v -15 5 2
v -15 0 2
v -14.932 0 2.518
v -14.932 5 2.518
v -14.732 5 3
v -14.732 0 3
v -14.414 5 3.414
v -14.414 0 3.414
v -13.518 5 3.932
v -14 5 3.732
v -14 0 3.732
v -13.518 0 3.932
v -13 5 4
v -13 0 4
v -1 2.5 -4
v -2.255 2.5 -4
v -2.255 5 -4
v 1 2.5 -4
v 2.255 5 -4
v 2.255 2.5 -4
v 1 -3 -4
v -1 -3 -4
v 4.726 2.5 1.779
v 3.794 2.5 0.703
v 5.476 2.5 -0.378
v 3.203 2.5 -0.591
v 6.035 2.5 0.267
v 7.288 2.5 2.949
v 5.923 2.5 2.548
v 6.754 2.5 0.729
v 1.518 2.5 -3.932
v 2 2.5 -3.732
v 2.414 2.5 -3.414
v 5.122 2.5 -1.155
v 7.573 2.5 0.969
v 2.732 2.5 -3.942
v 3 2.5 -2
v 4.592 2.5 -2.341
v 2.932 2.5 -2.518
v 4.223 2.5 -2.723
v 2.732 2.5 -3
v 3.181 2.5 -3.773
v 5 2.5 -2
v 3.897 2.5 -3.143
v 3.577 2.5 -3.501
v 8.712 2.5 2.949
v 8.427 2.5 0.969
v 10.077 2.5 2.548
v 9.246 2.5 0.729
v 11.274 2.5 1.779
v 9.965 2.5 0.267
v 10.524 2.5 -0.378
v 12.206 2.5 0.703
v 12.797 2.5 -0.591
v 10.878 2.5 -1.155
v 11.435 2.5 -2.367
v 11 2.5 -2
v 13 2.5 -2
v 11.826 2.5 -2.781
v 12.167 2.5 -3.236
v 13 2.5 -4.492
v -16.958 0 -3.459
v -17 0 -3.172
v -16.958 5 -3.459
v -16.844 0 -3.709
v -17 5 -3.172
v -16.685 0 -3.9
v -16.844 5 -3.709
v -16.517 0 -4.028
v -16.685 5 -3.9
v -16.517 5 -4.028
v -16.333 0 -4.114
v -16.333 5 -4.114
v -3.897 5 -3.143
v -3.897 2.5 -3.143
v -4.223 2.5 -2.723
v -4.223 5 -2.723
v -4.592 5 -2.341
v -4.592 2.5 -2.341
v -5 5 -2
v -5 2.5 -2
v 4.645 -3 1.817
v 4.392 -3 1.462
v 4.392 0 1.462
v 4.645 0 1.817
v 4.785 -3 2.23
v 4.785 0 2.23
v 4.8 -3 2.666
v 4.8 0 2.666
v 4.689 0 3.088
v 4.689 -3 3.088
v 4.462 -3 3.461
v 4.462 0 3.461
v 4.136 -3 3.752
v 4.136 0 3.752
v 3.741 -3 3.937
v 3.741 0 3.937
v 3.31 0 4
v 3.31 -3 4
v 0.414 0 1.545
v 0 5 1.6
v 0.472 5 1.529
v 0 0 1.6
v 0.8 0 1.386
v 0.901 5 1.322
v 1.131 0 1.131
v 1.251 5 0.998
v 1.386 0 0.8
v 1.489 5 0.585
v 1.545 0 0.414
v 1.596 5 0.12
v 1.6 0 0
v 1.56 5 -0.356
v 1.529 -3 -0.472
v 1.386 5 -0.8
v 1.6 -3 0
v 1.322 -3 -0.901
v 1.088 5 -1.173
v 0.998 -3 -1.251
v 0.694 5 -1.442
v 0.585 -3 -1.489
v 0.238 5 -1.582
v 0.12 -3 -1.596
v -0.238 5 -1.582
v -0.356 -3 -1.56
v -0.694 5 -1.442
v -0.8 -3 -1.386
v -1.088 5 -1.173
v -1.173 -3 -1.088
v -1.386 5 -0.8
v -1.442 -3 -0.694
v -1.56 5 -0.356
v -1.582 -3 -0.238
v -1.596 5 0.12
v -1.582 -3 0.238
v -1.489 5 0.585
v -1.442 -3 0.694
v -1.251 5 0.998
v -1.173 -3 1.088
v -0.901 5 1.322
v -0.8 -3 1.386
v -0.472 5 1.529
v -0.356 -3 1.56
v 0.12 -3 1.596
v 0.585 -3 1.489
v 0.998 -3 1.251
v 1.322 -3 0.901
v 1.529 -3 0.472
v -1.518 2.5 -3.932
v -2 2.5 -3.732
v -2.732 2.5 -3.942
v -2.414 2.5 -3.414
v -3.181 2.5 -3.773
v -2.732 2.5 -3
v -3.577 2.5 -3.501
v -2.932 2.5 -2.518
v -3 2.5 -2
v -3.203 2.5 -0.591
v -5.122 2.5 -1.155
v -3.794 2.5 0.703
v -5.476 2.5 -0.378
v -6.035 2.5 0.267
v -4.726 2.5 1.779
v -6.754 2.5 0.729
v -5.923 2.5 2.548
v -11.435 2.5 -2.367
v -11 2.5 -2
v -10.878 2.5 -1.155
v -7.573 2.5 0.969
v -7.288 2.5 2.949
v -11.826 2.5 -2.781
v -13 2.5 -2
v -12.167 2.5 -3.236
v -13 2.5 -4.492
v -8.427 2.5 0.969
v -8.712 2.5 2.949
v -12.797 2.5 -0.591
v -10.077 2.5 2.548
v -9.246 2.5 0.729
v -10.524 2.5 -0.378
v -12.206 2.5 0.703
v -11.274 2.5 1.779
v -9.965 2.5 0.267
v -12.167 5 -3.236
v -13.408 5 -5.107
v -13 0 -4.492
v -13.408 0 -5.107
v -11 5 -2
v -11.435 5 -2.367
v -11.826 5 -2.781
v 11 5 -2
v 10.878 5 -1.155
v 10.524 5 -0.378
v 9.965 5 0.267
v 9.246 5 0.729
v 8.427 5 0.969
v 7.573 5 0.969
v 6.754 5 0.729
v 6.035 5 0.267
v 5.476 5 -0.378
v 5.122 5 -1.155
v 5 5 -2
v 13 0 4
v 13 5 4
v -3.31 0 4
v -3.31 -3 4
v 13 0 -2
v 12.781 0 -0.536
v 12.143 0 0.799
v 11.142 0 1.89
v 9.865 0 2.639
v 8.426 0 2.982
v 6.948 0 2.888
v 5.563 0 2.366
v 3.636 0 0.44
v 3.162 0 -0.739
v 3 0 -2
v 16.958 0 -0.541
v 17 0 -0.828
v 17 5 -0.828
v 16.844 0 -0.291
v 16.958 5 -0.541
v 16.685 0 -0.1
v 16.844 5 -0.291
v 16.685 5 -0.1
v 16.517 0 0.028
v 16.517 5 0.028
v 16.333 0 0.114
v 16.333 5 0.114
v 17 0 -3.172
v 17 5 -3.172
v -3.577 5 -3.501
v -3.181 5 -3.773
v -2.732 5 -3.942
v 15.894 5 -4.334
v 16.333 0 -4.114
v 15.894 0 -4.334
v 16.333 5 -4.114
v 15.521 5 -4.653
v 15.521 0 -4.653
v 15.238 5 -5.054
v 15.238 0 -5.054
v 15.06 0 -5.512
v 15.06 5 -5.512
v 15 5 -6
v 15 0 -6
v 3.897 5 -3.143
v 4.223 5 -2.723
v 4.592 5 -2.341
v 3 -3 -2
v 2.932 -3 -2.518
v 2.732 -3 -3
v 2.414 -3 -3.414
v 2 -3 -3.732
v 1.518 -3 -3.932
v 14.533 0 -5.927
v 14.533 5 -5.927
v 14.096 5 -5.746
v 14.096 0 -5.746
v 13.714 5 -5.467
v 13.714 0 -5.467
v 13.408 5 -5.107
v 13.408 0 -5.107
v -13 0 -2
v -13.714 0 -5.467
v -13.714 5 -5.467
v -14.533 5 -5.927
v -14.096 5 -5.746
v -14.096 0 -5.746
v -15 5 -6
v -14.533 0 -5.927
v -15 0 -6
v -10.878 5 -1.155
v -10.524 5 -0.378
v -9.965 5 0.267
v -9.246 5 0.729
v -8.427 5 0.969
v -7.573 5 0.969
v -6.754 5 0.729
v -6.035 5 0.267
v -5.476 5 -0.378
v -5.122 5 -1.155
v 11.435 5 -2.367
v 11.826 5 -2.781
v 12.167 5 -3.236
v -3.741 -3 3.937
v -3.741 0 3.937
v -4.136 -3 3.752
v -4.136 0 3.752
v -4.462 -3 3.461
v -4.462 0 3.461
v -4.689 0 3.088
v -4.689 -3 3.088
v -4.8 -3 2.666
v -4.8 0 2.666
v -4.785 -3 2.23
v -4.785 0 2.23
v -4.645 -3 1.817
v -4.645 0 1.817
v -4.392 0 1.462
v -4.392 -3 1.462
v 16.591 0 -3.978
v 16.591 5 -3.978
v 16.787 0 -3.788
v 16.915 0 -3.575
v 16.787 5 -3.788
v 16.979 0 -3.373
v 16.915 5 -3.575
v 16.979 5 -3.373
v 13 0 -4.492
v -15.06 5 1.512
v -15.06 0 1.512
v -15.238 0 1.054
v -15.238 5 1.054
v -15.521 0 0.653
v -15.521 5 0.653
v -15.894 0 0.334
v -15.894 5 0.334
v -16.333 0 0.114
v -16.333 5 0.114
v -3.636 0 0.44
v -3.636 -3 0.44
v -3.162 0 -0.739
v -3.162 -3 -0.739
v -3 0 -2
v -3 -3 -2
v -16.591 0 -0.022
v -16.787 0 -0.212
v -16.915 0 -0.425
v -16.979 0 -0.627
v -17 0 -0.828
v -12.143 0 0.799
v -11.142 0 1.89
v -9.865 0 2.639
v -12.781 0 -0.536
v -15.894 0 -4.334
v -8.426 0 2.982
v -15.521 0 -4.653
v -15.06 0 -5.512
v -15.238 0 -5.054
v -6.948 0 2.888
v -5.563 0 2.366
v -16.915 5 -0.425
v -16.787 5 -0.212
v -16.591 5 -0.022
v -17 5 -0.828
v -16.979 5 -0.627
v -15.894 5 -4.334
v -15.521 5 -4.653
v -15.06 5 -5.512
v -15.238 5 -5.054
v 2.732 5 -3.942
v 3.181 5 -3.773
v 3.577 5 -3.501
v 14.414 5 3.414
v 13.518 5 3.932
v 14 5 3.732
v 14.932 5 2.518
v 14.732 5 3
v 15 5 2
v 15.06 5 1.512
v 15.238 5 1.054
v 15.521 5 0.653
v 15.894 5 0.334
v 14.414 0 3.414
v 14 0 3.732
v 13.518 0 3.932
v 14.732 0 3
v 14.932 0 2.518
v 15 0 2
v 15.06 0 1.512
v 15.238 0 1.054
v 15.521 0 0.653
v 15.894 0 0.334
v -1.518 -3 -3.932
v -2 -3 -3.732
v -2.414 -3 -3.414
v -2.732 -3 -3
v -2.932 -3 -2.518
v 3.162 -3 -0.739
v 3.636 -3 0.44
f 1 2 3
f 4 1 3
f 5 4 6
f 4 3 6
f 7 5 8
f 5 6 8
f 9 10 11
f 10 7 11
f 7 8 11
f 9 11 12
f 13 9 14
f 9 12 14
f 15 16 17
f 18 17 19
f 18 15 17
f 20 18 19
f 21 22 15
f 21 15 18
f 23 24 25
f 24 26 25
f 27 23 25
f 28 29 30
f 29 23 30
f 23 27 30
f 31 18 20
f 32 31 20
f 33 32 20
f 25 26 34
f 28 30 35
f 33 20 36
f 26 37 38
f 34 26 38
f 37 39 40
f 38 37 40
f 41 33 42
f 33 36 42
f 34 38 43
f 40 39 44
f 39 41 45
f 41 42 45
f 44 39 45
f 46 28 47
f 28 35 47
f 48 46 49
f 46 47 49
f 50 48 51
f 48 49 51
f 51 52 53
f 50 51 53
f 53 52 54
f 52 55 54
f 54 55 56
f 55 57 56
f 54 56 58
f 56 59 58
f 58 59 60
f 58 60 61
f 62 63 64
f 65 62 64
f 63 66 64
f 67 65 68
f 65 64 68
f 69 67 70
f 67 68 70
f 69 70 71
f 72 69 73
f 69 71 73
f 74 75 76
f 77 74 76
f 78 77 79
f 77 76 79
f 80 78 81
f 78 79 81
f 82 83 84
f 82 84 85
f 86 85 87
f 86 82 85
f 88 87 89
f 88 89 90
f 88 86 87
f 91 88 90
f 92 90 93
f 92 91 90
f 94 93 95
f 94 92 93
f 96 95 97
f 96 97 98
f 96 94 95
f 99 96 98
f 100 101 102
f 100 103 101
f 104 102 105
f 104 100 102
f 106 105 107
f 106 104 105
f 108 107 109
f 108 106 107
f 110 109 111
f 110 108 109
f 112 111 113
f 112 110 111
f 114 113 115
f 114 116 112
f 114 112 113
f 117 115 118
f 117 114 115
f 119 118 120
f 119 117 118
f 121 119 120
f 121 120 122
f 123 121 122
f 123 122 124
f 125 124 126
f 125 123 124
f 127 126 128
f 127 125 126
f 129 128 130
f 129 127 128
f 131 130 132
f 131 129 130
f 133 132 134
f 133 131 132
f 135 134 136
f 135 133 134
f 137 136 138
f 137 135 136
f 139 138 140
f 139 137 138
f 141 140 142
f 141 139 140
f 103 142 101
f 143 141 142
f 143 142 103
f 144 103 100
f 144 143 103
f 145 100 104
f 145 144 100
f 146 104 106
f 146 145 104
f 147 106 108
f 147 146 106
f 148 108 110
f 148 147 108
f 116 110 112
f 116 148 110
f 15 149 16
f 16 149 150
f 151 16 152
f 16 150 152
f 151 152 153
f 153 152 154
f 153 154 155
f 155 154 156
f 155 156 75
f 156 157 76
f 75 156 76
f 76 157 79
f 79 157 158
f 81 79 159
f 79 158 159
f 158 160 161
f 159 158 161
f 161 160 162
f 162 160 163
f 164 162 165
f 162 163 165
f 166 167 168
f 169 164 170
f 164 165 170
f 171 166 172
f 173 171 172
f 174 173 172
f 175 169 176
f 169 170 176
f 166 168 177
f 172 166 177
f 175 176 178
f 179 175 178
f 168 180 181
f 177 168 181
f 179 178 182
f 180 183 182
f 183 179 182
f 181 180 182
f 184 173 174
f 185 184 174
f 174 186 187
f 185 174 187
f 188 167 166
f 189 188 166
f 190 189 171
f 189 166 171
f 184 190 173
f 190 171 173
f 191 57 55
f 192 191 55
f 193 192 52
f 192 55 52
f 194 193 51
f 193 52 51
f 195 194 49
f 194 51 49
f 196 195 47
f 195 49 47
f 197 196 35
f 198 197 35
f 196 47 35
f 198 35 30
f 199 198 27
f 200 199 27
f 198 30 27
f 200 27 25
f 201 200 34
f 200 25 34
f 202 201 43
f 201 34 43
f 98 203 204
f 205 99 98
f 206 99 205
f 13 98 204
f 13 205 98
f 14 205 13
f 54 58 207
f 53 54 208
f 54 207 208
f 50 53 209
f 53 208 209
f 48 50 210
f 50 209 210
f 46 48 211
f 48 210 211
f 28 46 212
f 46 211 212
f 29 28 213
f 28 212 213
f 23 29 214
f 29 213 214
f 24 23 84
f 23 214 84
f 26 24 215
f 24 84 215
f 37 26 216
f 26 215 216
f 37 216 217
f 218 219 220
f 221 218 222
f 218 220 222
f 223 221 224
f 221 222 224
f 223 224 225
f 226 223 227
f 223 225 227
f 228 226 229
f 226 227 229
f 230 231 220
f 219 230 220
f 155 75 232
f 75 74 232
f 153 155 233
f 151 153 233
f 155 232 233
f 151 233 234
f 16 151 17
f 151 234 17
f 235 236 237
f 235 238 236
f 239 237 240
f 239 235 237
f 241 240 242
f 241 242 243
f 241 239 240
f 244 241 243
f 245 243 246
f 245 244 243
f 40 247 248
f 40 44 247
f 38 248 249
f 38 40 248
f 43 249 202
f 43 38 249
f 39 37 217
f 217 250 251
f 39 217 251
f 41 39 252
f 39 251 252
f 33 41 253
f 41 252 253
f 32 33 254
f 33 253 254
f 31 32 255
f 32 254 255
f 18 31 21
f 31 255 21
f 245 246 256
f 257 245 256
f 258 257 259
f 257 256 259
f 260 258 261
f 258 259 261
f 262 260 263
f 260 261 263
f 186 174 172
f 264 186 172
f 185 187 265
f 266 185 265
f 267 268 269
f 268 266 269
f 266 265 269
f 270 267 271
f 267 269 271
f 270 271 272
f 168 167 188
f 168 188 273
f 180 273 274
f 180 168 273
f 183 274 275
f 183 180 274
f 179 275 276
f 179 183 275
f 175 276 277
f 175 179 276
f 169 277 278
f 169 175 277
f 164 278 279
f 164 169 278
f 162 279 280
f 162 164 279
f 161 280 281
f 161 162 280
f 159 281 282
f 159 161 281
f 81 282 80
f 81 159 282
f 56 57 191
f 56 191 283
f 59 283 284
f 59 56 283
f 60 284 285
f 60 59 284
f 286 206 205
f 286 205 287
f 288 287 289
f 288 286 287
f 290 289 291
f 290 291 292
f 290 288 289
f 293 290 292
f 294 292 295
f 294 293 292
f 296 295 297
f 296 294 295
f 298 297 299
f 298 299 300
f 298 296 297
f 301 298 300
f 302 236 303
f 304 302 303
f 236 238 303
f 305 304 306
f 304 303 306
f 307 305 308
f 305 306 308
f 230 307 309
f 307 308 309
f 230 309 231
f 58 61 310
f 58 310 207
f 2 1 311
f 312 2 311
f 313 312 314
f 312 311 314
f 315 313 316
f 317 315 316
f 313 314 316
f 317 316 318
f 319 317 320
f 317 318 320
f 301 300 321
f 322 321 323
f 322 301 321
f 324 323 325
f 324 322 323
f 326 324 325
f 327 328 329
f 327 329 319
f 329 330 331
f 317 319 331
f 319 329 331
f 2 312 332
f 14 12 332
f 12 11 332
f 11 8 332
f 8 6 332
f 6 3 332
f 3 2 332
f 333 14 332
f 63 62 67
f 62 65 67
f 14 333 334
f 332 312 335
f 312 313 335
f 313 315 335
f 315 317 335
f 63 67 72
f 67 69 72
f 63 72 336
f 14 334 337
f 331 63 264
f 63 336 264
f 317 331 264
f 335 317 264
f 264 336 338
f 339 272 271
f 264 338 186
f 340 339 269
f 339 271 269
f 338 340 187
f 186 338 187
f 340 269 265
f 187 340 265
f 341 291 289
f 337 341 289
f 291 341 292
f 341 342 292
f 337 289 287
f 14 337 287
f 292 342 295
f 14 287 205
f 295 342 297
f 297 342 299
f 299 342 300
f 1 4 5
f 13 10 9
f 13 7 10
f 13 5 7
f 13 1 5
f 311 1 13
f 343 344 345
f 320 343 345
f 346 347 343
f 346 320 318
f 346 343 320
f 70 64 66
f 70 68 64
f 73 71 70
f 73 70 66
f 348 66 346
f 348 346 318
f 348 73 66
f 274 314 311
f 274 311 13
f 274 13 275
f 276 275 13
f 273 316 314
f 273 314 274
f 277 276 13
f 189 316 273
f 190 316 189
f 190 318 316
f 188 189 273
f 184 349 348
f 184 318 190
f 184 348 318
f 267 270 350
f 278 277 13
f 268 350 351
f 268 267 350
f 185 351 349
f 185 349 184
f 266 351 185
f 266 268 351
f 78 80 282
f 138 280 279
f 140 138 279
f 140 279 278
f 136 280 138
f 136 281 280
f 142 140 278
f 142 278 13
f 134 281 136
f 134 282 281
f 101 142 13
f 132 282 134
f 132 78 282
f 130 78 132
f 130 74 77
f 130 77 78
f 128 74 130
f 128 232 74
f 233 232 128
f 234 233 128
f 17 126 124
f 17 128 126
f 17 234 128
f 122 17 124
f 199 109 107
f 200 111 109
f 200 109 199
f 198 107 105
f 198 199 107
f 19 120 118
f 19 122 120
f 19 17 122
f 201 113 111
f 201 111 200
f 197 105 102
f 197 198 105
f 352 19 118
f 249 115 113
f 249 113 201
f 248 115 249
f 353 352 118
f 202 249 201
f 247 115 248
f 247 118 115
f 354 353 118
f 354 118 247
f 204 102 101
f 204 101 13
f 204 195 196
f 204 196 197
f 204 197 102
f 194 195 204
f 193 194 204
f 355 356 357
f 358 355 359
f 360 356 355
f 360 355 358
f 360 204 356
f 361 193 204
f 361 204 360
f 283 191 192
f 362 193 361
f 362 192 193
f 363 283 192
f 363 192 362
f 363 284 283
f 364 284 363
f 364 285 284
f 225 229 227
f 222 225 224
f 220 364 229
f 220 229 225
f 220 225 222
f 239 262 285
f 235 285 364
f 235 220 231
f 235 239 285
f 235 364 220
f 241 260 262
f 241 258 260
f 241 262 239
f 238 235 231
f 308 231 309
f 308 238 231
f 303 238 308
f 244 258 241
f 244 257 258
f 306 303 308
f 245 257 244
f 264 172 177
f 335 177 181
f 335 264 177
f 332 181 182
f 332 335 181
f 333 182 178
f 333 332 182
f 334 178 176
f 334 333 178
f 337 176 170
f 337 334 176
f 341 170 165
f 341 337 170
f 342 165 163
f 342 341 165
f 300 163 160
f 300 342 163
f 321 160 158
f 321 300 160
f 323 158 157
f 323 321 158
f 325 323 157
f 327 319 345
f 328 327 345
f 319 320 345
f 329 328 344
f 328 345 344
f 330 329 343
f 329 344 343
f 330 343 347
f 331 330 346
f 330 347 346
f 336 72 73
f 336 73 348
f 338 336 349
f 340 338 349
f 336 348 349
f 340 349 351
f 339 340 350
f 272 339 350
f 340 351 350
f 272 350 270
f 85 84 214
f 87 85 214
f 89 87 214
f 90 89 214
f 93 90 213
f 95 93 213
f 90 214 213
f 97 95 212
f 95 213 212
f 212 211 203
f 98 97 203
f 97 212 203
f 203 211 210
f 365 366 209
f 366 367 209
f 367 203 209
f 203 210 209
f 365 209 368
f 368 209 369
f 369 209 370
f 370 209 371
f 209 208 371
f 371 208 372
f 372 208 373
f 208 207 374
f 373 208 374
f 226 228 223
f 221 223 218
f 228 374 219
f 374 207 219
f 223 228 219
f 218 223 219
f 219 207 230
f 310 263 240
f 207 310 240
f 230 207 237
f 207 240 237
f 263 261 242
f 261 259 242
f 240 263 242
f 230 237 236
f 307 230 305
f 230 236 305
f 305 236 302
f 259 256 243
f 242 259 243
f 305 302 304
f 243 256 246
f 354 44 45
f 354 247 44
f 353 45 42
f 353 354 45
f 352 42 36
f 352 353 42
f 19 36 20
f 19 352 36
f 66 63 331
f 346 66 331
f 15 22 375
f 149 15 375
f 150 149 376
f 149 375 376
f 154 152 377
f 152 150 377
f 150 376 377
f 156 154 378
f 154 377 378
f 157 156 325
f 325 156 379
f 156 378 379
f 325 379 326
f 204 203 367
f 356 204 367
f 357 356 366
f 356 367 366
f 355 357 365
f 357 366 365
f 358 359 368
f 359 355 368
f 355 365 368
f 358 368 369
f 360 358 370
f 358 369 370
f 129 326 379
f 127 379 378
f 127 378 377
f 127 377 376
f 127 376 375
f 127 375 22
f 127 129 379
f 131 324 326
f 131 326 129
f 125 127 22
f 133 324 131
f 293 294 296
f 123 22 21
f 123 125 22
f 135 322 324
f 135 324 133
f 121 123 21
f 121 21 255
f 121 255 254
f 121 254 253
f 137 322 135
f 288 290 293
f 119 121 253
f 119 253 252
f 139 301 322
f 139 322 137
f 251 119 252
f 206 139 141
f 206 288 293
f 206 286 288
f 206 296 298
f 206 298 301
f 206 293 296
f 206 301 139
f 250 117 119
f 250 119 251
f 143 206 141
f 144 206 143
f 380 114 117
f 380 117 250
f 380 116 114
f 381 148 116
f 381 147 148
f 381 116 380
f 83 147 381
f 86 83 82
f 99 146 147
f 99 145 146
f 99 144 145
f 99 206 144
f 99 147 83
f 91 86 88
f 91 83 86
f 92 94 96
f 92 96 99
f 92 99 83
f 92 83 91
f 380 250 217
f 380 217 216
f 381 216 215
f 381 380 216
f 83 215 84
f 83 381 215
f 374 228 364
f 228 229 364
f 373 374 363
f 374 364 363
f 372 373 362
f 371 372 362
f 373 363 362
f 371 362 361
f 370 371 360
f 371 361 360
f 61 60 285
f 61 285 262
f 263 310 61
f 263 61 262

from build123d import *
from build123d.topology import SkipClean

# Parameters (mm, degrees)
SKETCH_1_R          = 1.6
EXTRUDE_1_DEPTH     = 5
CUT_EXTRUDE_1_DEPTH = 2.5
CUT_EXTRUDE_3_DEPTH = 17.347782724
CUT_EXTRUDE_4_DEPTH = 17.911534525
SKETCH_8_W          = 6.83484861
SKETCH_8_H          = 2
CUT_EXTRUDE_5_DEPTH = 17.911534525
EXTRUDE_START       = 3
SKETCH_14_R         = 1.6
EXTRUDE_7_DEPTH     = 3
FILLET_2_R          = 2
SKETCH_15_W         = 2
SKETCH_15_H         = 4
EXTRUDE_8_DEPTH     = 5
FILLET_3_R          = 2
FILLET_4_R          = 1


# Some blends are built 0.0001 mm under size
with BuildPart() as part:
    # 草图1 → 凸台-拉伸1 (new body)
    with BuildSketch(Plane(origin=(0, 0, 0), x_dir=(1, 0, 0), z_dir=(0, 1, 0))):
        Polygon((-15, -4), (15, -4), (15, 4), (15, 6), (-15, 6), (-15, 4), align=None)
        with Locations(Location((0, 0, 0), (0, 0, 270))):
            Circle(SKETCH_1_R, mode=Mode.SUBTRACT)
    extrude(amount=EXTRUDE_1_DEPTH)

    # 草图4 → 切除-拉伸1 (cut)
    with BuildSketch(Plane.XZ):
        with BuildLine():
            Line((-13, -6), (-13, -2))
            ThreePointArc((-13, -2), (-8, 3), (-3, -2))
            Line((-3, -2), (-3, -6))
            ThreePointArc((-3, -6), (-8, -11), (-13, -6))
        make_face()
        with BuildLine():
            Line((13, -6), (13, -2))
            ThreePointArc((13, -2), (8, 3), (3, -2))
            Line((3, -2), (3, -6))
            ThreePointArc((3, -6), (8, -11), (13, -6))
        make_face()
    extrude(amount=-CUT_EXTRUDE_1_DEPTH, mode=Mode.SUBTRACT)

    # 草图6 → 切除-拉伸3 (cut, through all)
    with BuildSketch(Plane.XZ.offset(-2.5)):
        with BuildLine():
            Line((-11, -6), (-11, -2))
            ThreePointArc((-11, -2), (-8, 1), (-5, -2))
            Line((-5, -2), (-5, -6))
            ThreePointArc((-5, -6), (-8, -9), (-11, -6))
        make_face()
        with BuildLine():
            Line((11, -6), (11, -2))
            ThreePointArc((11, -2), (8, 1), (5, -2))
            Line((5, -2), (5, -6))
            ThreePointArc((5, -6), (8, -9), (11, -6))
        make_face()
    extrude(amount=-CUT_EXTRUDE_3_DEPTH, mode=Mode.SUBTRACT)

    # 草图7 → 切除-拉伸4 (cut, through all)
    with BuildSketch(Plane.XZ):
        with BuildLine():
            Line((-12.166666667, -3.236146008), (-14, -6))
            Line((-14, -6), (-13, -6))
            ThreePointArc((-13, -6), (-3.212864461, -7.443375673), (-12.166666667, -3.236146008))
        make_face()
        with BuildLine():
            Line((14, -6), (13, -6))
            ThreePointArc((13, -6), (3.212864461, -7.443375673), (12.166666667, -3.236146008))
            Line((12.166666667, -3.236146008), (14, -6))
        make_face()
    extrude(amount=-CUT_EXTRUDE_4_DEPTH, mode=Mode.SUBTRACT)

    # 草图8 → 切除-拉伸5 (cut, through all)
    with BuildSketch(Plane.XZ):
        with Locations((0, -5)):
            Rectangle(SKETCH_8_W, SKETCH_8_H)
    extrude(amount=-CUT_EXTRUDE_5_DEPTH, mode=Mode.SUBTRACT)

    # 草图14 → 凸台-拉伸7 (add)
    with SkipClean():  # the faces are left unmerged after this step: merging them gives an invalid solid
        with BuildSketch(Plane.XZ.offset(EXTRUDE_START)):
            with BuildLine():
                Line((-3, -2), (-3, -4))
                Line((-3, -4), (3, -4))
                Line((3, -4), (3, -2))
                ThreePointArc((3, -2), (3.361031331, -0.134532313), (4.391987877, 1.461538462))
                ThreePointArc((4.391987877, 1.461538462), (4.689383557, 3.088348405), (3.30958424, 4))
                Line((3.30958424, 4), (-3.30958424, 4))
                ThreePointArc((-3.30958424, 4), (-4.689383557, 3.088348405), (-4.391987877, 1.461538462))
                ThreePointArc((-4.391987877, 1.461538462), (-3.361031331, -0.134532313), (-3, -2))
            make_face()
            Circle(SKETCH_14_R, mode=Mode.SUBTRACT)
        extrude(amount=-EXTRUDE_7_DEPTH)

    # 圆角2
    # the kernel refuses this fillet: 2 mm, written as the material it takes off along each edge
    with BuildSketch(Plane(origin=(-3, -8, -4), x_dir=(0, 0, 1), z_dir=(0, 1, 0)), Plane(origin=(3, -8, -4), x_dir=(-1, 0, 0), z_dir=(0, 1, 0))) as fillet_2_piece_1:
        with BuildLine():
            CenterArc((FILLET_2_R, FILLET_2_R), FILLET_2_R, 180, 90)
            Line((0, FILLET_2_R), (0, 0))
            Line((0, 0), (FILLET_2_R, 0))
        make_face()
    extrude(amount=8, mode=Mode.SUBTRACT)
    with BuildSketch(Plane(origin=(-15, -5, 4), x_dir=(1, 0, 0), z_dir=(0, 1, 0))) as fillet_2_piece_2:
        with BuildLine():
            CenterArc((FILLET_2_R, FILLET_2_R), FILLET_2_R, 180, 90)
            Line((0, FILLET_2_R), (0, 0))
            Line((0, 0), (FILLET_2_R, 0))
        make_face()
    extrude(amount=15, mode=Mode.SUBTRACT)
    with BuildSketch(Plane(origin=(15, -5, 4), x_dir=(-1, 0, 0), z_dir=(0, 1, 0))) as fillet_2_piece_3:
        with BuildLine():
            CenterArc((FILLET_2_R, -FILLET_2_R), FILLET_2_R, 90, 90)
            Line((0, -FILLET_2_R), (0, 0))
            Line((0, 0), (FILLET_2_R, 0))
        make_face()
    extrude(amount=15, mode=Mode.SUBTRACT)
    with BuildSketch(Plane(origin=(14, -2.679237314, -6), x_dir=(1, 0, 0), z_dir=(0, 1, 0))) as fillet_2_piece_4:
        with BuildLine():
            CenterArc((1.074265007, -1.998620702), FILLET_2_R, 92.128024951, 54.314665287)
            Line((-0.59240166, -0.893079105), (0, 0))
            Line((0, 0), (1, 0))
        make_face()
    extrude(amount=10.358474629, mode=Mode.SUBTRACT)
    with BuildSketch(Plane(origin=(-14, -2.679237314, -6), x_dir=(-1, 0, 0), z_dir=(0, 1, 0))) as fillet_2_piece_5:
        with BuildLine():
            CenterArc((1.074265007, 1.998620702), FILLET_2_R, 213.557309762, 54.314665287)
            Line((-0.59240166, 0.893079105), (0, 0))
            Line((0, 0), (1, 0))
        make_face()
    extrude(amount=10.358474629, mode=Mode.SUBTRACT)
    with BuildSketch(Plane(origin=(3, 2.5, -4), x_dir=(-1, 0, 0), z_dir=(0, -1, 0))) as fillet_2_piece_6:
        with BuildLine():
            CenterArc((FILLET_2_R, -FILLET_2_R), FILLET_2_R, 90, 90)
            Line((0, -FILLET_2_R), (0, 0))
            Line((0, 0), (FILLET_2_R, 0))
        make_face()
    extrude(amount=2.5, mode=Mode.SUBTRACT)
    with BuildSketch(Plane(origin=(-3, 2.5, -4), x_dir=(1, 0, 0), z_dir=(0, -1, 0))) as fillet_2_piece_7:
        with BuildLine():
            CenterArc((FILLET_2_R, FILLET_2_R), FILLET_2_R, 180, 90)
            Line((0, FILLET_2_R), (0, 0))
            Line((0, 0), (FILLET_2_R, 0))
        make_face()
    extrude(amount=2.5, mode=Mode.SUBTRACT)

    # 草图15 → 凸台-拉伸8 (add)
    with BuildSketch(Plane.XZ):
        with Locations((16, -2)):
            Rectangle(SKETCH_15_W, SKETCH_15_H)
        with Locations((-16, -2)):
            Rectangle(SKETCH_15_W, SKETCH_15_H)
    extrude(amount=-EXTRUDE_8_DEPTH)

    # 圆角3
    fillet_3_edges = [part.edges().sort_by_distance(p)[0] for p in [
        (3.417424305, 3.75, -4),
        (-3.417424305, 3.75, -4),
        (-15, 2.5, 0),
        (15, 2.5, 0),
        (-15, 2.5, -4),
        (15, 2.5, -4),
    ]]
    fillet(fillet_3_edges, radius=FILLET_3_R - 0.0001)  # a hair under: the kernel refuses the full size

    # 圆角4
    fillet_4_edges = [part.edges().sort_by_distance(p)[0] for p in [
        (17, 2.5, 0),
        (17, 2.5, -4),
        (-17, 2.5, -4),
        (-17, 2.5, 0),
    ]]
    fillet(fillet_4_edges, radius=FILLET_4_R)


solid = part.part
